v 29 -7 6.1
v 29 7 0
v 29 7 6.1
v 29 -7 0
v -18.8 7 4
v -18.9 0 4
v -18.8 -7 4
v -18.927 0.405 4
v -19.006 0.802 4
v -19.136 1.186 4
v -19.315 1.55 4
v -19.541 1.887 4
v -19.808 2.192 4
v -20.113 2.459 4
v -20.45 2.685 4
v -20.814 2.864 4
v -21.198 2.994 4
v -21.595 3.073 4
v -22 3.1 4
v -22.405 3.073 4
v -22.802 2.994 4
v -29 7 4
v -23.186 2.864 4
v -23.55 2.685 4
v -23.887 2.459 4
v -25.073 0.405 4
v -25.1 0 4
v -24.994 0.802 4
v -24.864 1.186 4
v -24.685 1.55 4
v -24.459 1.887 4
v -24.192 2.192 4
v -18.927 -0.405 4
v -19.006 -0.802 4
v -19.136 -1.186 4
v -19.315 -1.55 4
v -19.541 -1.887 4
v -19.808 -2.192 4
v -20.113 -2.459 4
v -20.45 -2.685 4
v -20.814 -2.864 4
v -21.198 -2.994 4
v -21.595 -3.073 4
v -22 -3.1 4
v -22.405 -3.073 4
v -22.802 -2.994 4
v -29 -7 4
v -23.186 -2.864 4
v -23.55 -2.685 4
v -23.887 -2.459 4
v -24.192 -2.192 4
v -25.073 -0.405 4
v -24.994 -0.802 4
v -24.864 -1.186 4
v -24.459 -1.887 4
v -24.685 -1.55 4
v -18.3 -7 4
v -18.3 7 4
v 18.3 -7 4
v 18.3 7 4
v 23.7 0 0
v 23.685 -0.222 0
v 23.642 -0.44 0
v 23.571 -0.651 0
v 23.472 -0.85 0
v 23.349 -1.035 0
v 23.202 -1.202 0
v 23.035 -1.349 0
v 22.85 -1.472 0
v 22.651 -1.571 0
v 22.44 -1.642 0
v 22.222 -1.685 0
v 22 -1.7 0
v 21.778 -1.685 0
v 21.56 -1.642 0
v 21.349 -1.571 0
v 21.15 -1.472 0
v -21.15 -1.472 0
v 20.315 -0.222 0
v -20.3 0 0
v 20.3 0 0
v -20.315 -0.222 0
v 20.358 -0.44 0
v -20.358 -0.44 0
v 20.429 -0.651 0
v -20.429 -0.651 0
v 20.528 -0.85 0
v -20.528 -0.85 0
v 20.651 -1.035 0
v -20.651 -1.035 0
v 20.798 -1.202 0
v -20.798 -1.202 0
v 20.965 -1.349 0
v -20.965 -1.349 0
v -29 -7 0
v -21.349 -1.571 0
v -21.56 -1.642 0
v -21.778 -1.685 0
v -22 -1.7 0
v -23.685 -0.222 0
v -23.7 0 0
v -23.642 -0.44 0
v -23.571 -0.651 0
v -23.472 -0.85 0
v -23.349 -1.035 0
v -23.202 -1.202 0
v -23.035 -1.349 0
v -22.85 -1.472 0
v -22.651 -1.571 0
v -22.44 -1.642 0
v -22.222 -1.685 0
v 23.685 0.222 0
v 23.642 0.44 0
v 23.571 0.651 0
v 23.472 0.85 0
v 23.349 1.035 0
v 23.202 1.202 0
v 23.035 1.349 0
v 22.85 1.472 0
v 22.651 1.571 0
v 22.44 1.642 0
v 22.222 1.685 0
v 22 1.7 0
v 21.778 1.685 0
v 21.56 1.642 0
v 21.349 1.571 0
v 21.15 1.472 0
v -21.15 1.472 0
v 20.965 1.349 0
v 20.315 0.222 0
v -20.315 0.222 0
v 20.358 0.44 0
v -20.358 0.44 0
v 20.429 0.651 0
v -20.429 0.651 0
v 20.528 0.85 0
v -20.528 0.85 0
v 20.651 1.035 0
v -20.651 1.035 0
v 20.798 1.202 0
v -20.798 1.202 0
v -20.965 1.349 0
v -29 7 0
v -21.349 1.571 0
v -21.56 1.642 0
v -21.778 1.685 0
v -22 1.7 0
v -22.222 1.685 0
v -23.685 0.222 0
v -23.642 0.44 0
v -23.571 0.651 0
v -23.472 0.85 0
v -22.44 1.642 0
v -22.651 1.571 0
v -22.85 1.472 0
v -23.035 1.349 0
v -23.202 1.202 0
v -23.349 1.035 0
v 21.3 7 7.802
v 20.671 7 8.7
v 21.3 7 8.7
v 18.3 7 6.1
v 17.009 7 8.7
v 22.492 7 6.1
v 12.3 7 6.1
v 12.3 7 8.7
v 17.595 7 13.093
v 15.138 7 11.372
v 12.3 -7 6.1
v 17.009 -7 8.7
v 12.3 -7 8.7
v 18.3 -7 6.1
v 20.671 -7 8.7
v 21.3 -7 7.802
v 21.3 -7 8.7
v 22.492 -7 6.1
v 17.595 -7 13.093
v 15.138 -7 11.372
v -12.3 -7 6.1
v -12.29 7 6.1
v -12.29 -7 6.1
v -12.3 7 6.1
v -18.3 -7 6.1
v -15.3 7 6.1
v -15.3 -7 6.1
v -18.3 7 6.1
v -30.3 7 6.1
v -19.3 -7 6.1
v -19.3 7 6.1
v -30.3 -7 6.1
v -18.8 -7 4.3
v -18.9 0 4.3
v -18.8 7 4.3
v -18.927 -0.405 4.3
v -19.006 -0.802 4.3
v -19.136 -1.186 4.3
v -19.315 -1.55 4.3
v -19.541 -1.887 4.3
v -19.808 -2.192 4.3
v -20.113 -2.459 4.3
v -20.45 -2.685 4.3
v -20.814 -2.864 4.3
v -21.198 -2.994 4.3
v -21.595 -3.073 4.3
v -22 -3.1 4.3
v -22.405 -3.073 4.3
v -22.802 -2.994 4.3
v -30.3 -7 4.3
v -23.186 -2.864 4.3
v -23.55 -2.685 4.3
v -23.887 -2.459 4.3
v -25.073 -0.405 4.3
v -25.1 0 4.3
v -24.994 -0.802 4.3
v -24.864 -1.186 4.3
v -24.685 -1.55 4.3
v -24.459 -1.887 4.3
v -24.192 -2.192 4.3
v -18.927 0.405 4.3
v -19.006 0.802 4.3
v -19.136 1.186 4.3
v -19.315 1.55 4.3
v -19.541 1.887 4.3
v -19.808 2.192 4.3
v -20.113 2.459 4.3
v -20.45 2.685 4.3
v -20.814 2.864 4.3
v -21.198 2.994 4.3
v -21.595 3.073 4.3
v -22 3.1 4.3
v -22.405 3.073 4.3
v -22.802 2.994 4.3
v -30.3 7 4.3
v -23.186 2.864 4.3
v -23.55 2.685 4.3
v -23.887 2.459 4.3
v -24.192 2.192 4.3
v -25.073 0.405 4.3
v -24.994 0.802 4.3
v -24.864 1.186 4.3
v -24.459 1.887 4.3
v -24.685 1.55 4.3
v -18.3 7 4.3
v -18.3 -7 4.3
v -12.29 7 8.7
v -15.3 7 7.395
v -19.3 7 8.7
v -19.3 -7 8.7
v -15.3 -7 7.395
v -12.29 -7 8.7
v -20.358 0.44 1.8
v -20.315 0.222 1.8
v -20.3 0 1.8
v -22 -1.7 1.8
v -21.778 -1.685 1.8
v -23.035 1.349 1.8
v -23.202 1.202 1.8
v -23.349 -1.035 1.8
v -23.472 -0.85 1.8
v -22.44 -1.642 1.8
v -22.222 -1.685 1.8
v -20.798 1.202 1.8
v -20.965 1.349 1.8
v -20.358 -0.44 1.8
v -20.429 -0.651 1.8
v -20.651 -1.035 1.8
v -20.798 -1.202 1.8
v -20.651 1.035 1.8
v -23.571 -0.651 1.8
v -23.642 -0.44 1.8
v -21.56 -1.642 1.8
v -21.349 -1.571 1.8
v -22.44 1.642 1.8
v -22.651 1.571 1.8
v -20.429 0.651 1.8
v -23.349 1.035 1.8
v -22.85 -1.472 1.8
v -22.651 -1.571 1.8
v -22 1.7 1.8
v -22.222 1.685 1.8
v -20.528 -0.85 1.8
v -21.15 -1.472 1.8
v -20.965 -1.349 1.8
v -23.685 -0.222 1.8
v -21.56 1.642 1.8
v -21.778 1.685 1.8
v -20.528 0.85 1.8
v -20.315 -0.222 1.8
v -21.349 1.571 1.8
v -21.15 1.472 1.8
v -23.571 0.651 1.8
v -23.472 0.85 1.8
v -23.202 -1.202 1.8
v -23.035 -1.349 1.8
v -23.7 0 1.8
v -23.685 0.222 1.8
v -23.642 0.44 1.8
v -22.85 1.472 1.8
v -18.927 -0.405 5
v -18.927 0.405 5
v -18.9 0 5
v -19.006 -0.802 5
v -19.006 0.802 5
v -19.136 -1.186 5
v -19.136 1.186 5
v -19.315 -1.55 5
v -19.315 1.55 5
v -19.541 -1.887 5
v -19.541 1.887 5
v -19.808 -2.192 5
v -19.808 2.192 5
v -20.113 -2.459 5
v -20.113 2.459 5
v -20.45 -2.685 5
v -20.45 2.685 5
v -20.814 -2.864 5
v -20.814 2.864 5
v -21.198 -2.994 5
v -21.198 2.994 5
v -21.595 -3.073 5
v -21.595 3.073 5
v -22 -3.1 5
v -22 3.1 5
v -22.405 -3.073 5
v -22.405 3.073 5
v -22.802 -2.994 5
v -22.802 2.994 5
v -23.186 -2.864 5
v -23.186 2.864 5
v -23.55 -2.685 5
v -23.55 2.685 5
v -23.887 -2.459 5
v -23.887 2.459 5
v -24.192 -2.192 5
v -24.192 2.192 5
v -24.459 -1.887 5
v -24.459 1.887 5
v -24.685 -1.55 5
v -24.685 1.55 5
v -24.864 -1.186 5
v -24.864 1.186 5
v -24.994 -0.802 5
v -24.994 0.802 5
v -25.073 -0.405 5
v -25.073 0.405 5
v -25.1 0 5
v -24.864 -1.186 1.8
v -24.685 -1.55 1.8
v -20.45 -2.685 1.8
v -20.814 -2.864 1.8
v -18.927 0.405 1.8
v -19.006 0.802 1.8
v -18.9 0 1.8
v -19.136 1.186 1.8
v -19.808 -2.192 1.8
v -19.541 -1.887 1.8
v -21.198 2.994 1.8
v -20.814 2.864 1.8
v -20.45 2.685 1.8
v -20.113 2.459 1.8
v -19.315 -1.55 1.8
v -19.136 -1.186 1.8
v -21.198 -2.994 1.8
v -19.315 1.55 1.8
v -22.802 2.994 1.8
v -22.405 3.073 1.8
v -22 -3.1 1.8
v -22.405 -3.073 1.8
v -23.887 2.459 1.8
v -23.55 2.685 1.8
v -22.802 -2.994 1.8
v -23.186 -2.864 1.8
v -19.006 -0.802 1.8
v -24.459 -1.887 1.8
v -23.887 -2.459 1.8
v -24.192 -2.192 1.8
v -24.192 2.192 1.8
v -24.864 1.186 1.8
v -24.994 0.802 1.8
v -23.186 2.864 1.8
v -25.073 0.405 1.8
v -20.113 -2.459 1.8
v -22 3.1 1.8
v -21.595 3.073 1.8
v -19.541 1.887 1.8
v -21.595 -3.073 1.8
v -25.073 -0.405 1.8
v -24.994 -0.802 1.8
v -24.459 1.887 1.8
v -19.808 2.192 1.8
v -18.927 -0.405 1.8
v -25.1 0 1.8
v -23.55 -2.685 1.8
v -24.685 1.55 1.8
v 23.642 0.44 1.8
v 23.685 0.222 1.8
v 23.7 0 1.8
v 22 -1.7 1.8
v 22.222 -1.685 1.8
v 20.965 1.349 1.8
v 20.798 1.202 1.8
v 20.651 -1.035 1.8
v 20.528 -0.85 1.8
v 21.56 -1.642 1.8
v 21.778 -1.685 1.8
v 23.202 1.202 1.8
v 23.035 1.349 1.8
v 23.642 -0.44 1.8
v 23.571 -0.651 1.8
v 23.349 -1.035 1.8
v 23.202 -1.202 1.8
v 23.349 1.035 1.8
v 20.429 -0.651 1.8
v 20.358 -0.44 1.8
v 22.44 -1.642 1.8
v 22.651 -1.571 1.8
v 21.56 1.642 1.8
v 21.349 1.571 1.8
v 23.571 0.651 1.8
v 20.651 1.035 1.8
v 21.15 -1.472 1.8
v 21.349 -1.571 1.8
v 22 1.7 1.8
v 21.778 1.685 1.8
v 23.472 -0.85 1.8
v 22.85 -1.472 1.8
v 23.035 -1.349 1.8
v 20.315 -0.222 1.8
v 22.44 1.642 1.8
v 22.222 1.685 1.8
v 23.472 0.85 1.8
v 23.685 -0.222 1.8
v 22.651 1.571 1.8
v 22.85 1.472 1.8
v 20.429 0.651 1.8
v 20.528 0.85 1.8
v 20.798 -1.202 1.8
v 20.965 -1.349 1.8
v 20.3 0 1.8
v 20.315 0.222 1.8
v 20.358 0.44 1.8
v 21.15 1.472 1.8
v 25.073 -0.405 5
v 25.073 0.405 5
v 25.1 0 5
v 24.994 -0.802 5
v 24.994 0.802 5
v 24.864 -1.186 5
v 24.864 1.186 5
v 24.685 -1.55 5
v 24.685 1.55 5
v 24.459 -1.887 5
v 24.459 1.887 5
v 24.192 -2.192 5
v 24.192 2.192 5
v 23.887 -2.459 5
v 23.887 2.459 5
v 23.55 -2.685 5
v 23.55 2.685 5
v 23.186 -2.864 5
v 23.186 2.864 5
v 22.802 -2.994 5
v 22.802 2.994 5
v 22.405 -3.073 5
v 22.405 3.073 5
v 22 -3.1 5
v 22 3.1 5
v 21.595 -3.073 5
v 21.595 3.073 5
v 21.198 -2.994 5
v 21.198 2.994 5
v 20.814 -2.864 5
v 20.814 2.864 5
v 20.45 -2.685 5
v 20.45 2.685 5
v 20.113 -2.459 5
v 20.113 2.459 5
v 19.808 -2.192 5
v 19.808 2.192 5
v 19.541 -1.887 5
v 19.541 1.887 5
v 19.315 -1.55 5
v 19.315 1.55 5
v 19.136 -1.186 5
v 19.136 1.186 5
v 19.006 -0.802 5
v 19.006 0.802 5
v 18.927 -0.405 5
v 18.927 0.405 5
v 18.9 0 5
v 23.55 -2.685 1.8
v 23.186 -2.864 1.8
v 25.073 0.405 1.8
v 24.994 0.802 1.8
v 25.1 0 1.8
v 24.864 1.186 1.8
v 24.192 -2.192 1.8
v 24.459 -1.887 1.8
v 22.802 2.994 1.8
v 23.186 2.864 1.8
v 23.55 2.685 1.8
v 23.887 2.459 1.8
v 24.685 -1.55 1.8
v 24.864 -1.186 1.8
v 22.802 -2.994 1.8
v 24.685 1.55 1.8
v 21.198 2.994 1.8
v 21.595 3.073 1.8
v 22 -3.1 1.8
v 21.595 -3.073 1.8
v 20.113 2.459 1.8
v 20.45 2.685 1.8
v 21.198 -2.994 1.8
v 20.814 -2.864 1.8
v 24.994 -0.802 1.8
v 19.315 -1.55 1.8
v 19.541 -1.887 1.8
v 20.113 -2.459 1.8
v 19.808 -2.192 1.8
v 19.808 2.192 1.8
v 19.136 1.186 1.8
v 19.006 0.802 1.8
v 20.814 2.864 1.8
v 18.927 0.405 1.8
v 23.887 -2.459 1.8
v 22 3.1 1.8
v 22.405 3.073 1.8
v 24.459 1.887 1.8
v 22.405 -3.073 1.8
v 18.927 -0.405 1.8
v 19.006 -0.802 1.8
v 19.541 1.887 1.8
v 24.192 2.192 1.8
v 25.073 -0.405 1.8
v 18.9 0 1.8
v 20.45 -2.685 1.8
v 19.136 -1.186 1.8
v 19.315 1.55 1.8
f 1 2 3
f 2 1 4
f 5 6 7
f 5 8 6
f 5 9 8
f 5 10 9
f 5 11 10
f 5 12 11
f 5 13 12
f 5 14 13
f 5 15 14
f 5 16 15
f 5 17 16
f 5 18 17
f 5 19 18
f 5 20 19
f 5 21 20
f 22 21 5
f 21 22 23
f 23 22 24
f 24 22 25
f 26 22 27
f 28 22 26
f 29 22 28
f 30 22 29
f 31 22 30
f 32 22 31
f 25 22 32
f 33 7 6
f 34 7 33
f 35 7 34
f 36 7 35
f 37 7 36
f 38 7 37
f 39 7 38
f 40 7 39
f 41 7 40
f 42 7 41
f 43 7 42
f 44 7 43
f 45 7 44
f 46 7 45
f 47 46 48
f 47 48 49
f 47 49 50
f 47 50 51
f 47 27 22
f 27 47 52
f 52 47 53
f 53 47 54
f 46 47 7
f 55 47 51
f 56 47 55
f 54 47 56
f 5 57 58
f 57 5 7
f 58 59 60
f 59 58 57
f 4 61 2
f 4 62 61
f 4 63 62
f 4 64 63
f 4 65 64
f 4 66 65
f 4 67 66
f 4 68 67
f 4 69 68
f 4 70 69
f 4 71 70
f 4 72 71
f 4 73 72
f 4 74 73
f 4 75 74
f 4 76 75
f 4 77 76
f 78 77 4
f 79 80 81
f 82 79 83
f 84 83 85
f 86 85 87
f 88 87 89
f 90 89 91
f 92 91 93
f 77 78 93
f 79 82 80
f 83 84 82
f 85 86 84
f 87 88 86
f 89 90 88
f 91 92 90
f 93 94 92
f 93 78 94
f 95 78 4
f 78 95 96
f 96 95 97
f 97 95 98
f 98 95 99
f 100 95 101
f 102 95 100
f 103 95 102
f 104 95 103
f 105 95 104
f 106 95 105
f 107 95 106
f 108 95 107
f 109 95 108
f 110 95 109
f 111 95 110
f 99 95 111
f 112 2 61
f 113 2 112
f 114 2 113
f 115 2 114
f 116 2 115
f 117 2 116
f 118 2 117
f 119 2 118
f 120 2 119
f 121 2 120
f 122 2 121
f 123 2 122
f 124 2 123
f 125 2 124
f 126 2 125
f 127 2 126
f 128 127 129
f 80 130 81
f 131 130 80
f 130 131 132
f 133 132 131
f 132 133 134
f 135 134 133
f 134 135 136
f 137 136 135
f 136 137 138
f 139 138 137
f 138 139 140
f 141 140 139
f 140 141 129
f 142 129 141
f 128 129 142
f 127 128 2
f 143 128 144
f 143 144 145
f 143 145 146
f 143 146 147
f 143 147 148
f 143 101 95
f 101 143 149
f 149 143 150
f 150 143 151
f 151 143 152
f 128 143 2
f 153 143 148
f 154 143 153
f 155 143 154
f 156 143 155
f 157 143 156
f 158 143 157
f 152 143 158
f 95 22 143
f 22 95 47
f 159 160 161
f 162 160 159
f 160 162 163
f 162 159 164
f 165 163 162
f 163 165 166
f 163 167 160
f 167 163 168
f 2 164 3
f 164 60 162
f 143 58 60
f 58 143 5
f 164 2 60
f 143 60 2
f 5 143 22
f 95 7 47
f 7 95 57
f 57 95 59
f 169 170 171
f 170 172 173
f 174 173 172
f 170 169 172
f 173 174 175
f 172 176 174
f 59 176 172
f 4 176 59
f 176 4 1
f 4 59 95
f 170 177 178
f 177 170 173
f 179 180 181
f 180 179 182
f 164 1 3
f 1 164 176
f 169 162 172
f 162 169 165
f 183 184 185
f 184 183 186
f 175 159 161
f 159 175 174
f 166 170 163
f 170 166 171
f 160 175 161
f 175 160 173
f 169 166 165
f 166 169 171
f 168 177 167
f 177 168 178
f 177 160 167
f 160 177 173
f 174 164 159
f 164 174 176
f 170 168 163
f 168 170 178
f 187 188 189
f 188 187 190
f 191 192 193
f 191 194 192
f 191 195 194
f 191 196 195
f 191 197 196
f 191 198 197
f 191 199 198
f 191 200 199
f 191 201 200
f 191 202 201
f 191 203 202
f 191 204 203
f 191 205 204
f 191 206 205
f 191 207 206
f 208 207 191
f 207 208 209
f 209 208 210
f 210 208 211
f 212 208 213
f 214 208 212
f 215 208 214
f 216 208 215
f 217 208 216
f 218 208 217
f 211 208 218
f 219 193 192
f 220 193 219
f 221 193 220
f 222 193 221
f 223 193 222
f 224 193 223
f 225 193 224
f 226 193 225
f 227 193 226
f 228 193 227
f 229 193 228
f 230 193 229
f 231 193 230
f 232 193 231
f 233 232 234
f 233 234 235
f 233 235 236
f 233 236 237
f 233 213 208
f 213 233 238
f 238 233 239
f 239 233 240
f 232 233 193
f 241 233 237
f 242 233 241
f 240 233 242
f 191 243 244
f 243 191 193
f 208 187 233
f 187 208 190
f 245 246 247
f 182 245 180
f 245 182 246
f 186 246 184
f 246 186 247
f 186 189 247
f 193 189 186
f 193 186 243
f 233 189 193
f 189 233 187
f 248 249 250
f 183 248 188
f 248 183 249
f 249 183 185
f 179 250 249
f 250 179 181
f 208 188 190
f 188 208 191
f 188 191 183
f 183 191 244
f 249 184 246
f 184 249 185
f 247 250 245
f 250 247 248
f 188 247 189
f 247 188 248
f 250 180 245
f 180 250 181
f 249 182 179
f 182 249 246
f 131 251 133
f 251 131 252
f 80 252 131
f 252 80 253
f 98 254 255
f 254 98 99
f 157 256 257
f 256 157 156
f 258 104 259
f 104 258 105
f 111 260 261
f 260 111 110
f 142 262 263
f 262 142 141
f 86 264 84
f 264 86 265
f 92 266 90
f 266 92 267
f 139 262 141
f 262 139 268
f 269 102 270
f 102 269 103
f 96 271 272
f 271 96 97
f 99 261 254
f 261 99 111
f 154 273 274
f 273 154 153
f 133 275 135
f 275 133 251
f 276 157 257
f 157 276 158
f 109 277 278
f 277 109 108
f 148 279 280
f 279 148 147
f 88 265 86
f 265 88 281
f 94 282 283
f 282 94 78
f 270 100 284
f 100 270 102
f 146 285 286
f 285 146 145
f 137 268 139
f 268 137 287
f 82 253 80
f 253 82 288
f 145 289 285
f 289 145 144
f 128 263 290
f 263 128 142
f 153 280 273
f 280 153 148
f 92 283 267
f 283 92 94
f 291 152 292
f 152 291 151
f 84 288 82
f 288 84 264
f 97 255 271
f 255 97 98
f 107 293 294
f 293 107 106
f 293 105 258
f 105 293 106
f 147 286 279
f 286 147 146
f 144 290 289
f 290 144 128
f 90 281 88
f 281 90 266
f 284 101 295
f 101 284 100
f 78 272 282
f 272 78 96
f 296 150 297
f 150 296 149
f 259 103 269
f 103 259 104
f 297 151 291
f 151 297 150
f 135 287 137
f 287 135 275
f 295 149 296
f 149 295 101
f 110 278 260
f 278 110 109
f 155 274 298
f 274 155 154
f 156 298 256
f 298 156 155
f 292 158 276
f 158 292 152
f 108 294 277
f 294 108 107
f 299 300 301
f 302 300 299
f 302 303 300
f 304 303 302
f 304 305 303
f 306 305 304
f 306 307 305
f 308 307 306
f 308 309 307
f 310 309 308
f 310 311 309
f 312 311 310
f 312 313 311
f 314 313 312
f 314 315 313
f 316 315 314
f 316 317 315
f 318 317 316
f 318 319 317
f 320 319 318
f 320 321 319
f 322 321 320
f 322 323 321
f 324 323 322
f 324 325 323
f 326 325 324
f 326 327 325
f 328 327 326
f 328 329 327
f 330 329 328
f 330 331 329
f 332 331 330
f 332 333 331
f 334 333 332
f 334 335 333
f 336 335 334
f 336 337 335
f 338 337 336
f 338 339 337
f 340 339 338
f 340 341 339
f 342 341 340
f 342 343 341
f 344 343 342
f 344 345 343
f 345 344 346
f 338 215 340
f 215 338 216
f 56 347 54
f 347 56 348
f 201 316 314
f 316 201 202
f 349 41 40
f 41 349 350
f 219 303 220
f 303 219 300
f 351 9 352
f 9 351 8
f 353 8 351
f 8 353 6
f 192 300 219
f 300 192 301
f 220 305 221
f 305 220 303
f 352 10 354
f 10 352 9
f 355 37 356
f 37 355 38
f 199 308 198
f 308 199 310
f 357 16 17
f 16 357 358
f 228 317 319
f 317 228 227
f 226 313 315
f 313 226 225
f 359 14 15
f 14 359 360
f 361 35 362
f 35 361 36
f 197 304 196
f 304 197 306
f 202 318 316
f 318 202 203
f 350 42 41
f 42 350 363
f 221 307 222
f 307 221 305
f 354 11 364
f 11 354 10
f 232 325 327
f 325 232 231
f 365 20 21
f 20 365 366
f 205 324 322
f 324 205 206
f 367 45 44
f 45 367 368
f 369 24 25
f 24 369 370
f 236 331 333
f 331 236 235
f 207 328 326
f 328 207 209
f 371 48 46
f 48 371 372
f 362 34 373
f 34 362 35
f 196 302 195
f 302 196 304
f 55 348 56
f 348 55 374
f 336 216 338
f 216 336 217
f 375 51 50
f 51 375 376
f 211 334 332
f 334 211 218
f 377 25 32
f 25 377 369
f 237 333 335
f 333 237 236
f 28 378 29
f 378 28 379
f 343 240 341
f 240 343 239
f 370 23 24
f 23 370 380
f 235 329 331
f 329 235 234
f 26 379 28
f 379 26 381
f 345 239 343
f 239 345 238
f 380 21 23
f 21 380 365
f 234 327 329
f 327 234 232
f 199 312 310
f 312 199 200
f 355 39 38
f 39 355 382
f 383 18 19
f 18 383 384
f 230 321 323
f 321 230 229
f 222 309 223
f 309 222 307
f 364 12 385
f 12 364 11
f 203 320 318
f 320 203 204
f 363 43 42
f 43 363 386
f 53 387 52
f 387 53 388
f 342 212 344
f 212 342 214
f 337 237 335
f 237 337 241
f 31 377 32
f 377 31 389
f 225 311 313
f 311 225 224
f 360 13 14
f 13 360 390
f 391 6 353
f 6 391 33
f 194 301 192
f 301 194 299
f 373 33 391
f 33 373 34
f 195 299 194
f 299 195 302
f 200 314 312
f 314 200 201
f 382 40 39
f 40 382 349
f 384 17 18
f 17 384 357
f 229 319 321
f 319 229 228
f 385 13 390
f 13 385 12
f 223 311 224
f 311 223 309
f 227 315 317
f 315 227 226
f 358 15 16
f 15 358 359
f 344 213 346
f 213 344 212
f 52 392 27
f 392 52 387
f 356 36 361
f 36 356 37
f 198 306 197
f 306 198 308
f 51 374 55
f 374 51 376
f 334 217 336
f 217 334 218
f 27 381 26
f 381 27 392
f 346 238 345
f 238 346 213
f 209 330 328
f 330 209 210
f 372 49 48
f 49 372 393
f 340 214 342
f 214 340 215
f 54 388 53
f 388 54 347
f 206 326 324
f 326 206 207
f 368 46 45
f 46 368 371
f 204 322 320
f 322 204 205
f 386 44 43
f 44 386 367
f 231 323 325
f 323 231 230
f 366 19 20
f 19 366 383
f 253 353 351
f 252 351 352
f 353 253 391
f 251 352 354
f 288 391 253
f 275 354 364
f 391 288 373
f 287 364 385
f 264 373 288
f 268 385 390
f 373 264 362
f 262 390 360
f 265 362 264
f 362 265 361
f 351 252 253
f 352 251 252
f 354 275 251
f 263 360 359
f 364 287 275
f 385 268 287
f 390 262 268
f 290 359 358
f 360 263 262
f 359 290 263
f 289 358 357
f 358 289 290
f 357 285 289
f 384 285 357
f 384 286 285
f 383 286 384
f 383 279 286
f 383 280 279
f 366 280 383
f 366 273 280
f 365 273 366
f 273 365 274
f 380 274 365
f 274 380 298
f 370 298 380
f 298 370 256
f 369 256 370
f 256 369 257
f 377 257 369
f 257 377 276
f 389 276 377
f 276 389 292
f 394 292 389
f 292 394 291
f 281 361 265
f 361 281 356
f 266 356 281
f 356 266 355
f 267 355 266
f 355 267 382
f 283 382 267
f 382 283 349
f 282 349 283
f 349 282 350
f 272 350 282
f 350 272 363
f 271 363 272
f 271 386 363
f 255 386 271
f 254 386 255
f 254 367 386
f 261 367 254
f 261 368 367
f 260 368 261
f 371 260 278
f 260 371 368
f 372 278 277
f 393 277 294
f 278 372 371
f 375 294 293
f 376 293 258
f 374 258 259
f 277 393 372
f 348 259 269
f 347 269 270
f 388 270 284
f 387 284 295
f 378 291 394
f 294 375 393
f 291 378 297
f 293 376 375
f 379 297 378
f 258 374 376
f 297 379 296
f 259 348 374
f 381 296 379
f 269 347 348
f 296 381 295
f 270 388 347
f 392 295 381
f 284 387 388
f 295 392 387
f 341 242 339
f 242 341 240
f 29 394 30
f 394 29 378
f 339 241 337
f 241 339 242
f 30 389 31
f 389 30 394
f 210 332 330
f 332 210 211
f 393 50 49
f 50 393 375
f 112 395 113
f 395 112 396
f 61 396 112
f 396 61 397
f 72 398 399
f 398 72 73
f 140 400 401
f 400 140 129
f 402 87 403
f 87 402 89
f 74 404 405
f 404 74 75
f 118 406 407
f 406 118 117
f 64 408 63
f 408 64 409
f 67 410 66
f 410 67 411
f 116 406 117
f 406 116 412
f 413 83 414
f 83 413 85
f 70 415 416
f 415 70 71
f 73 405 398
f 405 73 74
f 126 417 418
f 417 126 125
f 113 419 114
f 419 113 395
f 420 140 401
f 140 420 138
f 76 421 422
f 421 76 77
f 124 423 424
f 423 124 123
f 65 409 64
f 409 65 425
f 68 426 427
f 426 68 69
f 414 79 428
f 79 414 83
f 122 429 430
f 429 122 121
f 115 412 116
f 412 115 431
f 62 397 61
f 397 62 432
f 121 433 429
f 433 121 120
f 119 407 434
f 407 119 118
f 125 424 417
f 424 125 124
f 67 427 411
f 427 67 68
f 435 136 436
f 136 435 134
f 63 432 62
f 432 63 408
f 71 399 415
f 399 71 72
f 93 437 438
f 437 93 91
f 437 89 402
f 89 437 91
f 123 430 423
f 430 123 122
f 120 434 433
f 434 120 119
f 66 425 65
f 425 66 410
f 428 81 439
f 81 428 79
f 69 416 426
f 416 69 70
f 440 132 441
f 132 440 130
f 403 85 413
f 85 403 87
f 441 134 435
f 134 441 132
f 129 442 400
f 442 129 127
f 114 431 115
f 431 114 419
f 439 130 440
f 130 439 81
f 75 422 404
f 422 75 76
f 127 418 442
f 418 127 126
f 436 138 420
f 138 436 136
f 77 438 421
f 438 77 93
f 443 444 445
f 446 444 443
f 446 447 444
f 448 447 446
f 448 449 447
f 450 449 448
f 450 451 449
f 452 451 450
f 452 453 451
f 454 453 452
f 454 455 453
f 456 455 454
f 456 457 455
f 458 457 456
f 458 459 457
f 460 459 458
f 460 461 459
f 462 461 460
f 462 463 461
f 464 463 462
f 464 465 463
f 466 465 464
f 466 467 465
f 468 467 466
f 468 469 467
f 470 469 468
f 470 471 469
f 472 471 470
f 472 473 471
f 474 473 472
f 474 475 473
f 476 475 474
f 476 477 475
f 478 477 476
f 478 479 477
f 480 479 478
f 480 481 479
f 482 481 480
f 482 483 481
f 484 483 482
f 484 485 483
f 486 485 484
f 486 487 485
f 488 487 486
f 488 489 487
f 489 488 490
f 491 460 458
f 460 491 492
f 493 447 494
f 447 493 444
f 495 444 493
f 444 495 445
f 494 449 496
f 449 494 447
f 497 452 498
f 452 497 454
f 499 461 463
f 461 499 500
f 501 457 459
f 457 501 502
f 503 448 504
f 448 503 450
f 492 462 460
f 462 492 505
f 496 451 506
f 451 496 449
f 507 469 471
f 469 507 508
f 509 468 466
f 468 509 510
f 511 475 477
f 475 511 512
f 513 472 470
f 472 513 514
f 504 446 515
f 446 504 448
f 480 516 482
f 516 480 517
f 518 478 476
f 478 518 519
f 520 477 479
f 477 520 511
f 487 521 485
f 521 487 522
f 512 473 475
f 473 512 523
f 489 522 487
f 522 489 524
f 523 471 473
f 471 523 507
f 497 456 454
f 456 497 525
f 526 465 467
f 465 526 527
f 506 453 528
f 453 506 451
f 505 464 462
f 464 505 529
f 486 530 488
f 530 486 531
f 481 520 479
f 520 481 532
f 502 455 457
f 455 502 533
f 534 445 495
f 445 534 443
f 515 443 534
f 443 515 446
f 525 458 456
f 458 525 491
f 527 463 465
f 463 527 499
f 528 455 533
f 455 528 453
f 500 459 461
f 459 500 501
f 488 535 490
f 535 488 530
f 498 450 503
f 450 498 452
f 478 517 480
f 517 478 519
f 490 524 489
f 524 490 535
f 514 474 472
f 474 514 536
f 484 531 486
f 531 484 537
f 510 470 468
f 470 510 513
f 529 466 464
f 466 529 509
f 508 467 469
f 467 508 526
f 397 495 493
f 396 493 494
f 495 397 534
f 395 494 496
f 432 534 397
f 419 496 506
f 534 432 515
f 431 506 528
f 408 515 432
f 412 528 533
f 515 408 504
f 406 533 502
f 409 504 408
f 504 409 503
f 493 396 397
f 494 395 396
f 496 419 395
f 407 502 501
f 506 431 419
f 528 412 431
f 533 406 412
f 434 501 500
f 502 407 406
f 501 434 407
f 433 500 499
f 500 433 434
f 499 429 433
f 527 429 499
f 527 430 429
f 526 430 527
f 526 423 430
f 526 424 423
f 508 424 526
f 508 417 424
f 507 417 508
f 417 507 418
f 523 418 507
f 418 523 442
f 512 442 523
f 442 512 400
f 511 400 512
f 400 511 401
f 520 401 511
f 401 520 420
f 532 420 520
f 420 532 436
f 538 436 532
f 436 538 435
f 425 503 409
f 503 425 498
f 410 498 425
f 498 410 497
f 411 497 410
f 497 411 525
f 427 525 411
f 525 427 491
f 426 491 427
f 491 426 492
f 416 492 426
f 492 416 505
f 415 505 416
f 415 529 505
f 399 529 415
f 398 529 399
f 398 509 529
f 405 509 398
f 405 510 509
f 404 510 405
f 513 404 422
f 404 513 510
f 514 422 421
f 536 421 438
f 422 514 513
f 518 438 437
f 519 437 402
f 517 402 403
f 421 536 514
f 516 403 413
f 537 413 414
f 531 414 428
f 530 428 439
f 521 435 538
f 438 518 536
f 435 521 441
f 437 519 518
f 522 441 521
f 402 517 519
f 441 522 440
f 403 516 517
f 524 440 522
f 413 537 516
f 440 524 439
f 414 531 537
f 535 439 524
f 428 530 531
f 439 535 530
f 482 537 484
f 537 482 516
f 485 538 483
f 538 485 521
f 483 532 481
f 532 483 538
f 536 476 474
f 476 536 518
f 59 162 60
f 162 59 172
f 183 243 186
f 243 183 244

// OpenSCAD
// Base de montaje para riel DIN 35 (TS35) - ayModbusConverter MINI
// Impresion 3D. Se atornilla al dorso del chasis con 2 tornillos M3.
//
//   Exportar STL:  openscad -o clip_din35.stl clip_din35.scad
//   o abrirlo en OpenSCAD y pulsar F6 -> Exportar como STL.
//
// Se necesitan DOS unidades por equipo, separadas 60 mm (DIN_X = 30 en el PCB).

// ----------------------------------------------------------- parametros
rail_w     = 35.0;   // ancho nominal del riel TS35
rail_t     = 1.3;    // espesor del labio del riel
gap        = 0.8;    // holgura de montaje
clip_w     = 14.0;   // ancho del clip, en la direccion del riel
base_t     = 4.0;    // espesor de la base atornillada
hook       = 6.0;    // vuelo del gancho sobre el labio del riel
lip_t      = 2.6;    // espesor del gancho
screw_d    = 3.4;    // paso libre M3
head_d     = 6.2;    // alojamiento de la cabeza
head_h     = 2.2;
screw_sep  = 44.0;   // separacion entre tornillos (DIN_Y = 22 -> 44)
spring_t   = 1.8;    // espesor del brazo flexible
spring_len = 12.0;   // largo del brazo flexible
ears       = 7.0;    // material mas alla de los tornillos

$fn = 48;

half   = rail_w/2 + gap;          // semiancho libre para el riel
z_rail = base_t + rail_t + gap;   // cara superior del labio del riel
total  = screw_sep/2 + ears;      // semilargo de la pieza

// ----------------------------------------------------------- modulo
module clip() {
  difference() {
    union() {
      // base
      translate([-total, -clip_w/2, 0]) cube([2*total, clip_w, base_t]);

      // --- lado fijo: gancho rigido que engancha el labio superior
      translate([half - 1, -clip_w/2, 0])
        cube([total - half + 1, clip_w, z_rail]);
      translate([half - hook, -clip_w/2, z_rail])
        cube([hook + 3, clip_w, lip_t]);
      // refuerzo en diagonal
      translate([half + 2, -clip_w/2, base_t])
        rotate([0, -35, 0]) cube([3, clip_w, 9]);

      // --- lado flexible: brazo en voladizo que cede al montar
      translate([-total, -clip_w/2, 0])
        cube([total - half + 1 - spring_len, clip_w, z_rail]);
      // brazo delgado
      translate([-half - spring_len, -clip_w/2, z_rail - spring_t])
        cube([spring_len + 1, clip_w, spring_t]);
      // labio de enganche con rampa de entrada
      translate([-half - 1, -clip_w/2, z_rail - spring_t])
        cube([1 + 3, clip_w, spring_t + lip_t]);
      translate([-half + hook, -clip_w/2, z_rail])
        cube([0.01, clip_w, lip_t]);
      hull() {
        translate([-half, -clip_w/2, z_rail + lip_t - 0.01])
          cube([hook, clip_w, 0.01]);
        translate([-half + hook, -clip_w/2, z_rail])
          cube([0.01, clip_w, 0.01]);
      }
    }

    // --- taladros de fijacion
    for (x = [-screw_sep/2, screw_sep/2]) {
      translate([x, 0, -1])            cylinder(d = screw_d, h = base_t + 2);
      translate([x, 0, base_t - head_h]) cylinder(d = head_d, h = head_h + 1);
    }

    // --- hueco del riel, por si algun saliente invade
    translate([-half, -clip_w/2 - 1, base_t])
      cube([2*half, clip_w + 2, rail_t + gap]);

    // --- ranura de alivio para que el brazo flexione
    translate([-half - spring_len - 0.5, -clip_w/2 - 1, base_t])
      cube([spring_len, clip_w + 2, z_rail - spring_t - base_t]);
  }
}

clip();

// ----------------------------------------------------------- impresion
// Material   : PETG o ABS. El PLA cede con el calor del tablero.
// Orientacion: tal como queda aqui, la base sobre la cama. Las capas quedan
//              perpendicular al esfuerzo del brazo flexible, que es lo correcto.
// Perimetros : 4.  Relleno: 40 %.  Sin soporte.
// Comprobar  : el brazo debe ceder unos 2 mm al montar. Si queda duro, subir
//              spring_len o bajar spring_t en 0,2 mm.
